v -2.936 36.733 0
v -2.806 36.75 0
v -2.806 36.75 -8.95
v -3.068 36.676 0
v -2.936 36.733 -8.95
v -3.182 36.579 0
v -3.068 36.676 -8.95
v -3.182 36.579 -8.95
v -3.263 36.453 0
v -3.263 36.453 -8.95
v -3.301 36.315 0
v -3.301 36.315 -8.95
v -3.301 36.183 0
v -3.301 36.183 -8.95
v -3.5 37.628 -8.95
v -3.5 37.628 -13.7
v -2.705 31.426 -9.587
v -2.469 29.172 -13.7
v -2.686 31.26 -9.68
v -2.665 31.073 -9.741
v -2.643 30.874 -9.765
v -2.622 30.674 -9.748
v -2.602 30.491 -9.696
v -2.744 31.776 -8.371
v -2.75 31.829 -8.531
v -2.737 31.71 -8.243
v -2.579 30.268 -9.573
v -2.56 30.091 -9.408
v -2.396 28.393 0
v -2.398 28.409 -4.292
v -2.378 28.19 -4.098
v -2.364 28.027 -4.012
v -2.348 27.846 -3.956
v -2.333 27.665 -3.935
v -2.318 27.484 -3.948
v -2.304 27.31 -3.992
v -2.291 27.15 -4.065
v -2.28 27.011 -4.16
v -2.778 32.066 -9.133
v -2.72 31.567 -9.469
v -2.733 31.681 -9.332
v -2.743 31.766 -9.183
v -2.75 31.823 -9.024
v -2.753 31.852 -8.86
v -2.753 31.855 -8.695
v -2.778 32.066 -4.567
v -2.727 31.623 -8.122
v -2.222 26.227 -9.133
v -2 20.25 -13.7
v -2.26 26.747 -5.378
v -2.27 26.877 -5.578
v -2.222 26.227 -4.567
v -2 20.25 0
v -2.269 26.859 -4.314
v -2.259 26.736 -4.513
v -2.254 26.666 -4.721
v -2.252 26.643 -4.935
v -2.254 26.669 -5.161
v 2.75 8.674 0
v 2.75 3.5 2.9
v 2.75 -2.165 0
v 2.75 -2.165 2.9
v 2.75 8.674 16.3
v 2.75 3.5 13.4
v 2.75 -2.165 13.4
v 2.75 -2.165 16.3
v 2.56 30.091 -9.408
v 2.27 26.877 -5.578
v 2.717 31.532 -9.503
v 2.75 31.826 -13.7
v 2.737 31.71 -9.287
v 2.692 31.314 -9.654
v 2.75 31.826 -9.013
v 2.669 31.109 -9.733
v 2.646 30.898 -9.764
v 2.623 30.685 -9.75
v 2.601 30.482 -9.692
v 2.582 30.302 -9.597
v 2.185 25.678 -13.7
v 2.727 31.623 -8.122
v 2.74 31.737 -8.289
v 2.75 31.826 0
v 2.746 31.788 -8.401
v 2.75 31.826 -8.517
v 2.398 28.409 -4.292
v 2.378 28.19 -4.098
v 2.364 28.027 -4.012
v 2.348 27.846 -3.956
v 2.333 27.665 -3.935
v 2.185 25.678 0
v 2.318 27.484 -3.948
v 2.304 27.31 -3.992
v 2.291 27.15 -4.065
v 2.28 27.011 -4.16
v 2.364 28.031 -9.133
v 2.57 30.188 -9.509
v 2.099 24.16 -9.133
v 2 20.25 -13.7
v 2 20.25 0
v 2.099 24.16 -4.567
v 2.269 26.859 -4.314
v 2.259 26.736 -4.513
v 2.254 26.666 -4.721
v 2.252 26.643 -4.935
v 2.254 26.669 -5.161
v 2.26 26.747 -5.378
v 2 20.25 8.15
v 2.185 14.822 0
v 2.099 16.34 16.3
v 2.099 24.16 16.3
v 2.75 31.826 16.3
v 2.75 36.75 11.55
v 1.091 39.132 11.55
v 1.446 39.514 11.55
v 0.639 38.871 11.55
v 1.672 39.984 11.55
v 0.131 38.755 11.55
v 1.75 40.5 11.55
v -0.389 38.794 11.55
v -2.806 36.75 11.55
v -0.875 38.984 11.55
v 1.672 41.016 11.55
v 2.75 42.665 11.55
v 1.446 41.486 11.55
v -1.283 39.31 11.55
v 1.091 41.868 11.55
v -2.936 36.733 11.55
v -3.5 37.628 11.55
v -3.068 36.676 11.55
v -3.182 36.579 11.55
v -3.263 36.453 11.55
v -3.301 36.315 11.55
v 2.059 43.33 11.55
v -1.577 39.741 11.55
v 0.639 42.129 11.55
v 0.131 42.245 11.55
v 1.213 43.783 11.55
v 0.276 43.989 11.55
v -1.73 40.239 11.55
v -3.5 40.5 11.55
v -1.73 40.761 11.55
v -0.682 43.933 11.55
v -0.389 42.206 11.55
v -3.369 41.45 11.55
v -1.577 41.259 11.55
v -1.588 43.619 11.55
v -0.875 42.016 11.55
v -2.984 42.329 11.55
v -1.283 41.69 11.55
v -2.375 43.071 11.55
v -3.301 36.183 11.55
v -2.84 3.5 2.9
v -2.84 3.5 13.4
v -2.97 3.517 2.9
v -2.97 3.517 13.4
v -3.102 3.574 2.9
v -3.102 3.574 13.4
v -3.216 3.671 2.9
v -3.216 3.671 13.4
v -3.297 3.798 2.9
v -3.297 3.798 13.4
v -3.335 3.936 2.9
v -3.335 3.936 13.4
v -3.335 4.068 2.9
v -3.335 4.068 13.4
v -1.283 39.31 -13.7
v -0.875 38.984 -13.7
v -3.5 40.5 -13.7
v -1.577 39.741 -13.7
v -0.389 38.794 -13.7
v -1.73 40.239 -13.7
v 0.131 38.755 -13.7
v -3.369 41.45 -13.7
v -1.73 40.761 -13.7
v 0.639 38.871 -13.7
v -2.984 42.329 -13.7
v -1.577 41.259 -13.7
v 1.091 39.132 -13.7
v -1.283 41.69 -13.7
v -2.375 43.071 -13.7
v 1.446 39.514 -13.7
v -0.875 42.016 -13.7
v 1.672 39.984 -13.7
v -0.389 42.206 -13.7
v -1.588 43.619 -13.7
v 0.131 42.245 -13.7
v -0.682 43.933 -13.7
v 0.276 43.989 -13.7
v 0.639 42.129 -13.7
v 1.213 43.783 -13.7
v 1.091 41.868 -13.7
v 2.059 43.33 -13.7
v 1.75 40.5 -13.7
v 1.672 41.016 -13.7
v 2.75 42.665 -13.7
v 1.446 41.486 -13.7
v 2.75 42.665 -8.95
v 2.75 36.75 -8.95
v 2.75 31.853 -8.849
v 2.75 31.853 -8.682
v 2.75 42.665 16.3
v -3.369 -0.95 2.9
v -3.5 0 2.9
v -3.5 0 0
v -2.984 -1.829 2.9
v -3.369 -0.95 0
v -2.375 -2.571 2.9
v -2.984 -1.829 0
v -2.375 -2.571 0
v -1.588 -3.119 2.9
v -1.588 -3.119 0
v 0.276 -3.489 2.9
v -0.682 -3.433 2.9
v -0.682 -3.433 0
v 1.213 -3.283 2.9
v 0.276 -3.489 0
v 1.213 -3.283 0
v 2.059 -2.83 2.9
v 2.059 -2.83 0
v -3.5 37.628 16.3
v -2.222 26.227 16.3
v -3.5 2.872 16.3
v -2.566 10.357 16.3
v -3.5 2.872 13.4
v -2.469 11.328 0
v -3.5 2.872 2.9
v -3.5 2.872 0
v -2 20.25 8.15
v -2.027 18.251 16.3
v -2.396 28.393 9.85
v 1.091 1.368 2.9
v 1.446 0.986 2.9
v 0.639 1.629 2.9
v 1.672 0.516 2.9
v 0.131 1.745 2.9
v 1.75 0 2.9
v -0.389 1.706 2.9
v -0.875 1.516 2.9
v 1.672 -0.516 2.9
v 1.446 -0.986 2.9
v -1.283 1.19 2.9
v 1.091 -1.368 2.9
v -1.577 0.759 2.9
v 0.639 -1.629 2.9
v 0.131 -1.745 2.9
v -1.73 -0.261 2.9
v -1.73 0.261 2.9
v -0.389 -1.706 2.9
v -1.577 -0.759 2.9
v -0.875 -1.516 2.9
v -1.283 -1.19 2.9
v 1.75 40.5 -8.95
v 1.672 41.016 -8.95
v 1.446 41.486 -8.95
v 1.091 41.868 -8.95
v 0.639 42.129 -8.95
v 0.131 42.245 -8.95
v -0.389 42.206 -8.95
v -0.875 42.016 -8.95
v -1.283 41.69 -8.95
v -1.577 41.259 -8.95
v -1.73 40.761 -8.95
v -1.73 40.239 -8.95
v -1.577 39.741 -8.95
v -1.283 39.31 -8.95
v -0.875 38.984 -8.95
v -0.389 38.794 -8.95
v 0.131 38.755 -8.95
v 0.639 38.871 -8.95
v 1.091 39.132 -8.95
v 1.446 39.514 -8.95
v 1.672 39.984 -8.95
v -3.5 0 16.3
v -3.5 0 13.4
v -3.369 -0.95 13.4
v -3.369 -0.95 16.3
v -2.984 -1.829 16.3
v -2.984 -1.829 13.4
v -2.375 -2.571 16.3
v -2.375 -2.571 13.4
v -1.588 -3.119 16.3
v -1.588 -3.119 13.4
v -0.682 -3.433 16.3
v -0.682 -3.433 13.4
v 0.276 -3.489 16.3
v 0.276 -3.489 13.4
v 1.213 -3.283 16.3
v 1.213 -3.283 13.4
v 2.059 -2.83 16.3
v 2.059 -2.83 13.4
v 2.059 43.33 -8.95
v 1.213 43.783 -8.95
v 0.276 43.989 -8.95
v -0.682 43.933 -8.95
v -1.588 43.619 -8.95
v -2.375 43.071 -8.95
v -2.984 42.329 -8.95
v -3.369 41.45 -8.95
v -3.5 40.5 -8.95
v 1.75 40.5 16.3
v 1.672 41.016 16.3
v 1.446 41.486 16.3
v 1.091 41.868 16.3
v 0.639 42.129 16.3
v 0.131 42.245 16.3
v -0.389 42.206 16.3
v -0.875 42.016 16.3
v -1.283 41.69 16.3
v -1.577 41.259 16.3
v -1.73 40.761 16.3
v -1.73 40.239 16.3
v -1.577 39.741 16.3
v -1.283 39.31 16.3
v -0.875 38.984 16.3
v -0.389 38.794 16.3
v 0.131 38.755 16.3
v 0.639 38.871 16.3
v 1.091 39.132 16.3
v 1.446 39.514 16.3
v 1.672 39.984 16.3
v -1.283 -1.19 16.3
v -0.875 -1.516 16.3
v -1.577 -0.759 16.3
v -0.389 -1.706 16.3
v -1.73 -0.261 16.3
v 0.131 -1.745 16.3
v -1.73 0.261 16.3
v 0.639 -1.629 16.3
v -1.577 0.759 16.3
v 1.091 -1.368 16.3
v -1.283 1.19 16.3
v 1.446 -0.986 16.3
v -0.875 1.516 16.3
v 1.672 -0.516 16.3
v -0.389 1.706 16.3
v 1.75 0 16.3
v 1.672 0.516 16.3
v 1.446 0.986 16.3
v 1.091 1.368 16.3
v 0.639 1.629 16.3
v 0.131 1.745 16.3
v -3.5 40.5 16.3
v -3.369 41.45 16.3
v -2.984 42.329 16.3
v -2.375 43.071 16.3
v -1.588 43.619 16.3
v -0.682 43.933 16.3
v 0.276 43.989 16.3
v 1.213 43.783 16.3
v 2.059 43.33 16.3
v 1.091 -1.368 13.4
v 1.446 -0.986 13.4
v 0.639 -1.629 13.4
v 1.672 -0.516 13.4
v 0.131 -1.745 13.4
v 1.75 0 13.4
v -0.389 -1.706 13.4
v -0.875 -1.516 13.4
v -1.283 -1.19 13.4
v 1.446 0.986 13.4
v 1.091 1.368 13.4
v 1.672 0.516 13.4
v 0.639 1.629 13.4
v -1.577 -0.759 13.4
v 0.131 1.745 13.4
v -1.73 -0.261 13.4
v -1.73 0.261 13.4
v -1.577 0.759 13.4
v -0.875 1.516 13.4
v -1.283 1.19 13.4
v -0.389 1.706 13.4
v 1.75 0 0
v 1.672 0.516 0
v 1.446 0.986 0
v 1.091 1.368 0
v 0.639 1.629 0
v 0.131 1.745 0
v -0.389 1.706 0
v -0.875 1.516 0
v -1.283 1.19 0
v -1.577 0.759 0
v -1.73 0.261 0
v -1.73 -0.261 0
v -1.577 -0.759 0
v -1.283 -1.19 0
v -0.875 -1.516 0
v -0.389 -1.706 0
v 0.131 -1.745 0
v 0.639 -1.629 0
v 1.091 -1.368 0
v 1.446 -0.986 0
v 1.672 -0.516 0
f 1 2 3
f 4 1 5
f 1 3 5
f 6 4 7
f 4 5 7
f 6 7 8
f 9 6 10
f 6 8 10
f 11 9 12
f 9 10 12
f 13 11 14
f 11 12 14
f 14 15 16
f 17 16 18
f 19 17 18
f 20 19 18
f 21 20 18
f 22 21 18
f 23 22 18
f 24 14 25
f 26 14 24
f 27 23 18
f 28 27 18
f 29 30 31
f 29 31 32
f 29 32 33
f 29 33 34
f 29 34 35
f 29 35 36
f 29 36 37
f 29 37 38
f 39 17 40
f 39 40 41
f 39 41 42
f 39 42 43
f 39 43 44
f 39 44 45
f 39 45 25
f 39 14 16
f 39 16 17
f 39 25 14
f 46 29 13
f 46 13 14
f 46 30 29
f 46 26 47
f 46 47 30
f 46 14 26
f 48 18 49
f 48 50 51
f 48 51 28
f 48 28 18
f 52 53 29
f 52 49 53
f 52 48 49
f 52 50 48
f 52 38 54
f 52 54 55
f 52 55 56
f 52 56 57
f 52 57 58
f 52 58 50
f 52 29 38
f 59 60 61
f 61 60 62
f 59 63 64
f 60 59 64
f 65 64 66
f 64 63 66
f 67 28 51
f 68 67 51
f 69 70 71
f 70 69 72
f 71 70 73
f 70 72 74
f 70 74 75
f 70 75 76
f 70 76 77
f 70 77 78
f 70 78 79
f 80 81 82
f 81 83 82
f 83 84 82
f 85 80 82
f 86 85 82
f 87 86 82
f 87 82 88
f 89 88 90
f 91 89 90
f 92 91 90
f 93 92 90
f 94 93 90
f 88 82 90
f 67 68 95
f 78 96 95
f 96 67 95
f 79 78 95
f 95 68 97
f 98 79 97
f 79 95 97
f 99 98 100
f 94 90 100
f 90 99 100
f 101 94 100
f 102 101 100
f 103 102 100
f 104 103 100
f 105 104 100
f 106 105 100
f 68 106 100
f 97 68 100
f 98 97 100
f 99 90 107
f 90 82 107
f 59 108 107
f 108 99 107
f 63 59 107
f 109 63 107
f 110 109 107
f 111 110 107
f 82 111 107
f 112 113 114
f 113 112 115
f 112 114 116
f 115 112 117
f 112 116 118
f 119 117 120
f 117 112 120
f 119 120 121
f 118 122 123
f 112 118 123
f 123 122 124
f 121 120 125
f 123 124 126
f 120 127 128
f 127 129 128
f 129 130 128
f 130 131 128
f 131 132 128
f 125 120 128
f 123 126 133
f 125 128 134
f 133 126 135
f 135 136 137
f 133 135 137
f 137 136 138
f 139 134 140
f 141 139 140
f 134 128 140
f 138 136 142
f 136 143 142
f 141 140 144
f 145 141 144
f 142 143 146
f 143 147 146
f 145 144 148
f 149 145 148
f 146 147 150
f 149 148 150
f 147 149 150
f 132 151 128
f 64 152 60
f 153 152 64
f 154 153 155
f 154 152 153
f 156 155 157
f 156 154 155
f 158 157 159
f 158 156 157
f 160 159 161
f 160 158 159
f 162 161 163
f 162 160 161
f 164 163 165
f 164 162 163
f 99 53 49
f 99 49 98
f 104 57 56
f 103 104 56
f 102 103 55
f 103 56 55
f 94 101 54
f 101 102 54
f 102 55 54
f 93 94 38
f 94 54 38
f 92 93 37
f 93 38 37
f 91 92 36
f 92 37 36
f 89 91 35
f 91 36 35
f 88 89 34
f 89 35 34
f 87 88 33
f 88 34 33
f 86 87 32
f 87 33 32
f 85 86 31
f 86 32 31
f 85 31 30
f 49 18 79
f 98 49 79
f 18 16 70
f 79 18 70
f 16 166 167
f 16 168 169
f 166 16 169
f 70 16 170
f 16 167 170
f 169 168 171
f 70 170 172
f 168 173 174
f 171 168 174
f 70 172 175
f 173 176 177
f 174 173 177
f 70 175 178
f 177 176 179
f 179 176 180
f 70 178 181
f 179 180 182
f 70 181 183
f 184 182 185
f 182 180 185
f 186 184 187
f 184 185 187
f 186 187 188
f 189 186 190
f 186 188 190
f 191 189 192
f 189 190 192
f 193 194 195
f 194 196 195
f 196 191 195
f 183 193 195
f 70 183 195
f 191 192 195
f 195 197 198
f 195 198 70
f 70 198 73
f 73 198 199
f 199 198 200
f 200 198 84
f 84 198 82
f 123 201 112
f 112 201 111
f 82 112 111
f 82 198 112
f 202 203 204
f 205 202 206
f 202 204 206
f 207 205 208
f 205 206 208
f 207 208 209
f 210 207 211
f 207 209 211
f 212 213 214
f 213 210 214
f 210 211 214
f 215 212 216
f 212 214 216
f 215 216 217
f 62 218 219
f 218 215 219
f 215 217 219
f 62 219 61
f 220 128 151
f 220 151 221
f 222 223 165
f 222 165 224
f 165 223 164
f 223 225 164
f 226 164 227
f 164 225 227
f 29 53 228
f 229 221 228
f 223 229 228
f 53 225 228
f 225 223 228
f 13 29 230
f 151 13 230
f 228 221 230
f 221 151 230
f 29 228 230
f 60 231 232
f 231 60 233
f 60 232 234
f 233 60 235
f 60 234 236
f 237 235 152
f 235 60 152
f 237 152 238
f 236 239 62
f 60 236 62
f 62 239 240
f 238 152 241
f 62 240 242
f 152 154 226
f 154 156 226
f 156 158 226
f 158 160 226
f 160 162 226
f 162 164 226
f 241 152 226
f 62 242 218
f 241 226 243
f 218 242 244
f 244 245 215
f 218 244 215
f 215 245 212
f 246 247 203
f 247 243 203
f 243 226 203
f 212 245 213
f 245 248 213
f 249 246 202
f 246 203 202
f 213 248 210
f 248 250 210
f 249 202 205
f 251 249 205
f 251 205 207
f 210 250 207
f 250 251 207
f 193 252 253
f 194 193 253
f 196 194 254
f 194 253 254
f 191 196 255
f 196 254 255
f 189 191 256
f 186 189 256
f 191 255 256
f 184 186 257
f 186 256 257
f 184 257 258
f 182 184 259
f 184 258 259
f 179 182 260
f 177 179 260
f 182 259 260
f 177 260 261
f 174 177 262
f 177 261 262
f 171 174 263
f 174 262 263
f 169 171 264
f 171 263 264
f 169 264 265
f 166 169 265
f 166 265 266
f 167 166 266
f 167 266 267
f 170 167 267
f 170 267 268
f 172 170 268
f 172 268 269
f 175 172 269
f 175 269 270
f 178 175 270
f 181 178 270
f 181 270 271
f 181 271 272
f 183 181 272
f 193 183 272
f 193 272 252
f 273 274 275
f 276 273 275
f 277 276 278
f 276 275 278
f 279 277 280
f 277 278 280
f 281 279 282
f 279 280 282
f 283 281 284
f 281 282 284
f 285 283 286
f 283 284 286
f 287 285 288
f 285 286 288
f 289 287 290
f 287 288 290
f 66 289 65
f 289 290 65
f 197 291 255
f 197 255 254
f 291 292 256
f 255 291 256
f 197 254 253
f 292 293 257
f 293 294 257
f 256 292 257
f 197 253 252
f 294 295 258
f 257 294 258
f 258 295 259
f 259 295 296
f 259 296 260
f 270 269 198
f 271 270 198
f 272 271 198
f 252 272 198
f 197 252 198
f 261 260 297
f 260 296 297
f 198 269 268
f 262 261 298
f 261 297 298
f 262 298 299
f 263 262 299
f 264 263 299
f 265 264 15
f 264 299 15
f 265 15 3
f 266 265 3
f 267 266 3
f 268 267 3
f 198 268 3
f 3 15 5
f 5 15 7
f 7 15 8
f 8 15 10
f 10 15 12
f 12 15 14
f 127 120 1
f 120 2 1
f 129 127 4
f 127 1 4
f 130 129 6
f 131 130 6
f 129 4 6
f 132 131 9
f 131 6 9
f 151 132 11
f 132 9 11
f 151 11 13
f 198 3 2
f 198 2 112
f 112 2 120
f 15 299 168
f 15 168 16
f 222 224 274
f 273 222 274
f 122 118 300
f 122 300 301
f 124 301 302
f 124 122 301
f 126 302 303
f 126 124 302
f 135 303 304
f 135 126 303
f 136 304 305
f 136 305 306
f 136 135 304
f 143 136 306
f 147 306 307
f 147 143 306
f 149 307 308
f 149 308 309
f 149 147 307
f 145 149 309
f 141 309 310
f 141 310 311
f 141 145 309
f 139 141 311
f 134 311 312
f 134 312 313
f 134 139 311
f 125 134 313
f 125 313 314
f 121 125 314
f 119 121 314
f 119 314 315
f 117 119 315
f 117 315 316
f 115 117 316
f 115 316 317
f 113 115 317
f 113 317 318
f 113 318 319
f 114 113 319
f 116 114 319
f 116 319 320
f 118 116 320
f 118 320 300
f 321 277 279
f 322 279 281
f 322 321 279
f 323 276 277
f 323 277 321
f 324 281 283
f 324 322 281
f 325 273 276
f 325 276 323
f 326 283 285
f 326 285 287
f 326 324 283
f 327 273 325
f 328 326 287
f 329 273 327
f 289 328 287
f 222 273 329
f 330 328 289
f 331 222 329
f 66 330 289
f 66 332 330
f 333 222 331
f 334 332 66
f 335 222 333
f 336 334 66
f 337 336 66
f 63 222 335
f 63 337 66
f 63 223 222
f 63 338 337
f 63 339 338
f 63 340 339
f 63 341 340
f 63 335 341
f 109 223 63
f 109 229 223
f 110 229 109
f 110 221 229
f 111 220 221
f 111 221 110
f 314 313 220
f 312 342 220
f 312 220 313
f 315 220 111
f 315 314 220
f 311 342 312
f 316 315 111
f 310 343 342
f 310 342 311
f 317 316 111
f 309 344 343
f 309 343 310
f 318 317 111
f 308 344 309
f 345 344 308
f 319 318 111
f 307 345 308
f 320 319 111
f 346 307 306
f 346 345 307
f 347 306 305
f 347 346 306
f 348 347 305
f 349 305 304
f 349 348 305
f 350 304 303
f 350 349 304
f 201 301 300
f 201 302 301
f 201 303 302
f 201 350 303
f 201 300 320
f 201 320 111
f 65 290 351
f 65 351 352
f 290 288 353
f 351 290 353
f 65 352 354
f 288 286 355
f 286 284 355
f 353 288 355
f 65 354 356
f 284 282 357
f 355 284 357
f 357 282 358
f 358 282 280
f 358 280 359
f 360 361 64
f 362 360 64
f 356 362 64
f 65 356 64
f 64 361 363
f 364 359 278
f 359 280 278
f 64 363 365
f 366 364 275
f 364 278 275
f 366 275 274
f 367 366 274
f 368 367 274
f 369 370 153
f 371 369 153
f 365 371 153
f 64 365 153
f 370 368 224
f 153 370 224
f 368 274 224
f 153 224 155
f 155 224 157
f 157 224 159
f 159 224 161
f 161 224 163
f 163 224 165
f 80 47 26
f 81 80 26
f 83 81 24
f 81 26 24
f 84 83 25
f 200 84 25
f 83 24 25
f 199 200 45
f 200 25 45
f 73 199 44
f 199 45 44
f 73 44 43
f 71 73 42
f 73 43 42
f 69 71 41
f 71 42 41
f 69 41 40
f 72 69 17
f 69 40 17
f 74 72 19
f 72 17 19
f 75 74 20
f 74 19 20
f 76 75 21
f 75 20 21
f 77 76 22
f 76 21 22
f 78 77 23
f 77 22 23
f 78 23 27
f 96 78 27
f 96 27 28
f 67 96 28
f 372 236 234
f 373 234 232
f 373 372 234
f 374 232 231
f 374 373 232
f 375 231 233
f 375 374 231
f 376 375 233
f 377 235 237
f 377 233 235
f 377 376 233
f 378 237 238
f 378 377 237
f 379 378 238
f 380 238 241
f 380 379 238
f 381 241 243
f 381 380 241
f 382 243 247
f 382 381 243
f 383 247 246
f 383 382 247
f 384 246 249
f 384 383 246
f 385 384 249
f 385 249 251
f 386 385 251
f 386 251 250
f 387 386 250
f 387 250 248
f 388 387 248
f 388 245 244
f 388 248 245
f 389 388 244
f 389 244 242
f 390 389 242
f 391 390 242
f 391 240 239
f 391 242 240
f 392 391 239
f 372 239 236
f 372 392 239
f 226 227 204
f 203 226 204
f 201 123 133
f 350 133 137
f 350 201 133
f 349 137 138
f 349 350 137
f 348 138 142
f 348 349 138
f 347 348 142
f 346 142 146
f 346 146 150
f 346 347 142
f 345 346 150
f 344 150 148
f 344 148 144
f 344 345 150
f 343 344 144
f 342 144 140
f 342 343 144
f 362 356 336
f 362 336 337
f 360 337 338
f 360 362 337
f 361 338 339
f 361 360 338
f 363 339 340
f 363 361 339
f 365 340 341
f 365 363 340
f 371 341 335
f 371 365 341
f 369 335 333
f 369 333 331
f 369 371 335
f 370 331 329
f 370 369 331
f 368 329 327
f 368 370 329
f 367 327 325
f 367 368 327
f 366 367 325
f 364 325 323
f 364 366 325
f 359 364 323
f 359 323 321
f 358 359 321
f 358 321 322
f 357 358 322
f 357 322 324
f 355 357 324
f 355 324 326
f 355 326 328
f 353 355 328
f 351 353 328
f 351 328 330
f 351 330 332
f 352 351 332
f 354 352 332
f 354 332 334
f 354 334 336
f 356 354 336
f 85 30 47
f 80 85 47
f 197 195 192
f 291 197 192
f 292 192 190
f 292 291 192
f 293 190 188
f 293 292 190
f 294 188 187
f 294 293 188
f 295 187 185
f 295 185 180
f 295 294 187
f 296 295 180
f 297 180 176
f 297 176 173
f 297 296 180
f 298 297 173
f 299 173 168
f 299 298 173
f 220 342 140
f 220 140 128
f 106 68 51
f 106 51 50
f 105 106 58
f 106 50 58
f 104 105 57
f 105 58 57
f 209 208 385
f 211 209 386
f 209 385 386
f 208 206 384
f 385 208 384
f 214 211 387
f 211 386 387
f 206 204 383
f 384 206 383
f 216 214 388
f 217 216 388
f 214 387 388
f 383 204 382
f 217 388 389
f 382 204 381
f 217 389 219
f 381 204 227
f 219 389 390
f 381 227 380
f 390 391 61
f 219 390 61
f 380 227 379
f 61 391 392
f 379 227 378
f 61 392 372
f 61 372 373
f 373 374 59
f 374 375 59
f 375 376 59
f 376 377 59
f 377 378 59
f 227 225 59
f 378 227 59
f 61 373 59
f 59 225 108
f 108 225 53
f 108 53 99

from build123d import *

# Parameters (mm, degrees)
F0_R     = 1.75
F1_DEPTH = 16.3
F2_W     = 0.6277186767
F2_H     = 10.5
F2_W_2   = 2.8722813233
F2_W_3   = 3.5
F3_DEPTH = 25
F4_DEPTH = 13.7
F5_W     = 3.75
F5_H     = 20.5
F6_DEPTH = 25
F7_R     = 0.5
F9_DEPTH = 44


# Not quite as in the source:
# - a feature names something its author has since deleted; it is built from what else it names


with BuildPart() as f1:
    # F0 (on Top) → F1 (new body)
    with BuildSketch(Plane.XY):
        with BuildLine():
            ThreePointArc((-3.5, 0), (0, -3.5), (3.5, 0))
            ThreePointArc((3.5, 0), (0, 3.5), (-3.5, 0))
        make_face()
        Circle(F0_R, mode=Mode.SUBTRACT)
        with BuildLine():
            ThreePointArc((-3.5, 40.5), (0, 37), (3.5, 40.5))
            ThreePointArc((3.5, 40.5), (0, 44), (-3.5, 40.5))
        make_face()
        with Locations((0, 40.5)):
            Circle(F0_R, mode=Mode.SUBTRACT)
        with BuildLine():
            Line((-2, 20.25), (2, 20.25))
            add(Edge.make_bspline(
                [(3.5, 37.6277186767), (2.75, 32.25), (2, 26.25), (2, 20.25)],
                knots=[0, 0, 0, 0, 0.5, 0.5, 0.5, 0.5], degree=3))
            Line((3.5, 37.6277186767), (3.5, 40.5))
            ThreePointArc((3.5, 40.5), (0, 37), (-3.5, 40.5))
            Line((-3.5, 40.5), (-3.5, 37.6277186767))
            add(Edge.make_bspline(
                [(-3.5, 37.6277186767), (-2.75, 32.25), (-2, 26.25), (-2, 20.25)],
                knots=[0, 0, 0, 0, 0.5, 0.5, 0.5, 0.5], degree=3))
        make_face()
        with BuildLine():
            ThreePointArc((-3.5, 0), (0, 3.5), (3.5, 0))
            Line((3.5, 0), (3.5, 2.8722813233))
            add(Edge.make_bspline(
                [(2, 20.25), (2, 14.25), (2.75, 8.25), (3.5, 2.8722813233)],
                knots=[0.5, 0.5, 0.5, 0.5, 1, 1, 1, 1], degree=3))
            Line((2, 20.25), (-2, 20.25))
            add(Edge.make_bspline(
                [(-2, 20.25), (-2, 14.25), (-2.75, 8.25), (-3.5, 2.8722813233)],
                knots=[0.5, 0.5, 0.5, 0.5, 1, 1, 1, 1], degree=3))
            Line((-3.5, 2.8722813233), (-3.5, 0))
        make_face()
    extrude(amount=F1_DEPTH)

    # F2 (on face) → F3 (cut)
    with BuildSketch(Plane(origin=(-3.5, 0, 0), x_dir=(0, -1, 0), z_dir=(-1, 0, 0))):
        with Locations((-3.1861406616, 8.15)):
            Rectangle(F2_W, F2_H)
        with Locations((-1.4361406616, 8.15)):
            Rectangle(F2_W_2, F2_H)
        with Locations((1.75, 8.15)):
            Rectangle(F2_W_3, F2_H)
    extrude(amount=-F3_DEPTH, mode=Mode.SUBTRACT)

    # F0 (on Top) → F4 (join)
    with BuildSketch(Plane.XY):
        with BuildLine():
            ThreePointArc((-3.5, 40.5), (0, 37), (3.5, 40.5))
            ThreePointArc((3.5, 40.5), (0, 44), (-3.5, 40.5))
        make_face()
        with Locations((0, 40.5)):
            Circle(F0_R, mode=Mode.SUBTRACT)
        with BuildLine():
            Line((-2, 20.25), (2, 20.25))
            add(Edge.make_bspline(
                [(3.5, 37.6277186767), (2.75, 32.25), (2, 26.25), (2, 20.25)],
                knots=[0, 0, 0, 0, 0.5, 0.5, 0.5, 0.5], degree=3))
            Line((3.5, 37.6277186767), (3.5, 40.5))
            ThreePointArc((3.5, 40.5), (0, 37), (-3.5, 40.5))
            Line((-3.5, 40.5), (-3.5, 37.6277186767))
            add(Edge.make_bspline(
                [(-3.5, 37.6277186767), (-2.75, 32.25), (-2, 26.25), (-2, 20.25)],
                knots=[0, 0, 0, 0, 0.5, 0.5, 0.5, 0.5], degree=3))
        make_face()
    extrude(amount=-F4_DEPTH)

    # F5 (on face) → F6 (cut)
    with BuildSketch(Plane(origin=(-3.5, 0, 0), x_dir=(0, -1, 0), z_dir=(-1, 0, 0))):
        with Locations((-42.375, 1.3)):
            Rectangle(F5_W, F5_H)
        Polygon((-37.6277186767, 0), (-37.6277186767, 11.55), (-40.5, 11.55), (-40.5, -8.95), (-37.6277186767, -8.95), align=None)
        Polygon((-36.75, -8.95), (-36.75, 11.55), (-37.6277186767, 11.55), (-37.6277186767, 0), (-37.6277186767, -8.95), align=None)
        with BuildLine():
            ThreePointArc((-30.0909245811, -9.4078987175), (-29.9172764034, -9.1071312511), (-29.8569690242, -8.7651111078))
            ThreePointArc((-29.8569690242, -8.7651111078), (-30.5149488809, -7.825418487), (-31.6230134673, -8.1223234981))
            ThreePointArc((-31.6230134673, -8.1223234981), (-31.4997566339, -9.5311555509), (-30.0909245811, -9.4078987175))
        make_face()
        with BuildLine():
            ThreePointArc((-31.6230134673, -8.1223234981), (-30.5149488809, -7.825418487), (-29.8569690242, -8.7651111078))
            ThreePointArc((-29.8569690242, -8.7651111078), (-29.9172764034, -9.1071312511), (-30.0909245811, -9.4078987175))
            Line((-30.0909245811, -9.4078987175), (-26.8769865327, -5.5776765019))
            ThreePointArc((-26.8769865327, -5.5776765019), (-28.2858185855, -5.7009333353), (-28.4090754189, -4.2921012825))
            Line((-28.4090754189, -4.2921012825), (-31.6230134673, -8.1223234981))
        make_face()
        with BuildLine():
            ThreePointArc((-26.6430309758, -4.9348888922), (-27.3010108325, -3.9951962714), (-28.4090754189, -4.2921012825))
            ThreePointArc((-28.4090754189, -4.2921012825), (-28.2858185855, -5.7009333353), (-26.8769865327, -5.5776765019))
            ThreePointArc((-26.8769865327, -5.5776765019), (-26.703338355, -5.2769090355), (-26.6430309758, -4.9348888922))
        make_face()
    extrude(amount=-F6_DEPTH, mode=Mode.SUBTRACT)

    # F7
    f7_edges = [f1.edges().sort_by_distance(p)[0] for p in [
        (-3.412885, 3.5, 8.15),
        (3.412885, 3.5, 8.15),
        (3.378456, 36.75, 5.775),
        (3.378456, 36.75, -4.475),
        (-3.378456, 36.75, 5.775),
        (-3.378456, 36.75, -4.475),
    ]]
    fillet(f7_edges, radius=F7_R)

    # F8 (on face) → F9 (cut)
    with BuildSketch(Plane.XY.offset(16.3)):
        with BuildLine():
            ThreePointArc((3.5, 40.5), (3.3071891388, 41.6456439237), (2.75, 42.6650635095))
            Line((2.75, 42.6650635095), (2.75, 31.8256302364))
            add(Edge.make_bspline(
                [(2.75, 31.8256302364), (2.979055467, 33.8173381724), (3.2395277335, 35.7600565803), (3.5, 37.6277186767)],
                knots=[1.3263518223, 1.3263518223, 1.3263518223, 1.3263518223, 1.5, 1.5, 1.5, 1.5], degree=3))
            Line((3.5, 37.6277186767), (3.5, 40.5))
        make_face()
        with BuildLine():
            add(Edge.make_bspline(
                [(3.5, 2.8722813233), (3.2395277335, 4.7399434197), (2.979055467, 6.6826618276), (2.75, 8.6743697636)],
                knots=[0.5, 0.5, 0.5, 0.5, 0.6736481777, 0.6736481777, 0.6736481777, 0.6736481777], degree=3))
            Line((2.75, 8.6743697636), (2.75, -2.1650635095))
            ThreePointArc((2.75, -2.1650635095), (3.3071891388, -1.1456439237), (3.5, 0))
            Line((3.5, 0), (3.5, 2.8722813233))
        make_face()
    extrude(amount=-F9_DEPTH, mode=Mode.SUBTRACT)


solid = f1.part
